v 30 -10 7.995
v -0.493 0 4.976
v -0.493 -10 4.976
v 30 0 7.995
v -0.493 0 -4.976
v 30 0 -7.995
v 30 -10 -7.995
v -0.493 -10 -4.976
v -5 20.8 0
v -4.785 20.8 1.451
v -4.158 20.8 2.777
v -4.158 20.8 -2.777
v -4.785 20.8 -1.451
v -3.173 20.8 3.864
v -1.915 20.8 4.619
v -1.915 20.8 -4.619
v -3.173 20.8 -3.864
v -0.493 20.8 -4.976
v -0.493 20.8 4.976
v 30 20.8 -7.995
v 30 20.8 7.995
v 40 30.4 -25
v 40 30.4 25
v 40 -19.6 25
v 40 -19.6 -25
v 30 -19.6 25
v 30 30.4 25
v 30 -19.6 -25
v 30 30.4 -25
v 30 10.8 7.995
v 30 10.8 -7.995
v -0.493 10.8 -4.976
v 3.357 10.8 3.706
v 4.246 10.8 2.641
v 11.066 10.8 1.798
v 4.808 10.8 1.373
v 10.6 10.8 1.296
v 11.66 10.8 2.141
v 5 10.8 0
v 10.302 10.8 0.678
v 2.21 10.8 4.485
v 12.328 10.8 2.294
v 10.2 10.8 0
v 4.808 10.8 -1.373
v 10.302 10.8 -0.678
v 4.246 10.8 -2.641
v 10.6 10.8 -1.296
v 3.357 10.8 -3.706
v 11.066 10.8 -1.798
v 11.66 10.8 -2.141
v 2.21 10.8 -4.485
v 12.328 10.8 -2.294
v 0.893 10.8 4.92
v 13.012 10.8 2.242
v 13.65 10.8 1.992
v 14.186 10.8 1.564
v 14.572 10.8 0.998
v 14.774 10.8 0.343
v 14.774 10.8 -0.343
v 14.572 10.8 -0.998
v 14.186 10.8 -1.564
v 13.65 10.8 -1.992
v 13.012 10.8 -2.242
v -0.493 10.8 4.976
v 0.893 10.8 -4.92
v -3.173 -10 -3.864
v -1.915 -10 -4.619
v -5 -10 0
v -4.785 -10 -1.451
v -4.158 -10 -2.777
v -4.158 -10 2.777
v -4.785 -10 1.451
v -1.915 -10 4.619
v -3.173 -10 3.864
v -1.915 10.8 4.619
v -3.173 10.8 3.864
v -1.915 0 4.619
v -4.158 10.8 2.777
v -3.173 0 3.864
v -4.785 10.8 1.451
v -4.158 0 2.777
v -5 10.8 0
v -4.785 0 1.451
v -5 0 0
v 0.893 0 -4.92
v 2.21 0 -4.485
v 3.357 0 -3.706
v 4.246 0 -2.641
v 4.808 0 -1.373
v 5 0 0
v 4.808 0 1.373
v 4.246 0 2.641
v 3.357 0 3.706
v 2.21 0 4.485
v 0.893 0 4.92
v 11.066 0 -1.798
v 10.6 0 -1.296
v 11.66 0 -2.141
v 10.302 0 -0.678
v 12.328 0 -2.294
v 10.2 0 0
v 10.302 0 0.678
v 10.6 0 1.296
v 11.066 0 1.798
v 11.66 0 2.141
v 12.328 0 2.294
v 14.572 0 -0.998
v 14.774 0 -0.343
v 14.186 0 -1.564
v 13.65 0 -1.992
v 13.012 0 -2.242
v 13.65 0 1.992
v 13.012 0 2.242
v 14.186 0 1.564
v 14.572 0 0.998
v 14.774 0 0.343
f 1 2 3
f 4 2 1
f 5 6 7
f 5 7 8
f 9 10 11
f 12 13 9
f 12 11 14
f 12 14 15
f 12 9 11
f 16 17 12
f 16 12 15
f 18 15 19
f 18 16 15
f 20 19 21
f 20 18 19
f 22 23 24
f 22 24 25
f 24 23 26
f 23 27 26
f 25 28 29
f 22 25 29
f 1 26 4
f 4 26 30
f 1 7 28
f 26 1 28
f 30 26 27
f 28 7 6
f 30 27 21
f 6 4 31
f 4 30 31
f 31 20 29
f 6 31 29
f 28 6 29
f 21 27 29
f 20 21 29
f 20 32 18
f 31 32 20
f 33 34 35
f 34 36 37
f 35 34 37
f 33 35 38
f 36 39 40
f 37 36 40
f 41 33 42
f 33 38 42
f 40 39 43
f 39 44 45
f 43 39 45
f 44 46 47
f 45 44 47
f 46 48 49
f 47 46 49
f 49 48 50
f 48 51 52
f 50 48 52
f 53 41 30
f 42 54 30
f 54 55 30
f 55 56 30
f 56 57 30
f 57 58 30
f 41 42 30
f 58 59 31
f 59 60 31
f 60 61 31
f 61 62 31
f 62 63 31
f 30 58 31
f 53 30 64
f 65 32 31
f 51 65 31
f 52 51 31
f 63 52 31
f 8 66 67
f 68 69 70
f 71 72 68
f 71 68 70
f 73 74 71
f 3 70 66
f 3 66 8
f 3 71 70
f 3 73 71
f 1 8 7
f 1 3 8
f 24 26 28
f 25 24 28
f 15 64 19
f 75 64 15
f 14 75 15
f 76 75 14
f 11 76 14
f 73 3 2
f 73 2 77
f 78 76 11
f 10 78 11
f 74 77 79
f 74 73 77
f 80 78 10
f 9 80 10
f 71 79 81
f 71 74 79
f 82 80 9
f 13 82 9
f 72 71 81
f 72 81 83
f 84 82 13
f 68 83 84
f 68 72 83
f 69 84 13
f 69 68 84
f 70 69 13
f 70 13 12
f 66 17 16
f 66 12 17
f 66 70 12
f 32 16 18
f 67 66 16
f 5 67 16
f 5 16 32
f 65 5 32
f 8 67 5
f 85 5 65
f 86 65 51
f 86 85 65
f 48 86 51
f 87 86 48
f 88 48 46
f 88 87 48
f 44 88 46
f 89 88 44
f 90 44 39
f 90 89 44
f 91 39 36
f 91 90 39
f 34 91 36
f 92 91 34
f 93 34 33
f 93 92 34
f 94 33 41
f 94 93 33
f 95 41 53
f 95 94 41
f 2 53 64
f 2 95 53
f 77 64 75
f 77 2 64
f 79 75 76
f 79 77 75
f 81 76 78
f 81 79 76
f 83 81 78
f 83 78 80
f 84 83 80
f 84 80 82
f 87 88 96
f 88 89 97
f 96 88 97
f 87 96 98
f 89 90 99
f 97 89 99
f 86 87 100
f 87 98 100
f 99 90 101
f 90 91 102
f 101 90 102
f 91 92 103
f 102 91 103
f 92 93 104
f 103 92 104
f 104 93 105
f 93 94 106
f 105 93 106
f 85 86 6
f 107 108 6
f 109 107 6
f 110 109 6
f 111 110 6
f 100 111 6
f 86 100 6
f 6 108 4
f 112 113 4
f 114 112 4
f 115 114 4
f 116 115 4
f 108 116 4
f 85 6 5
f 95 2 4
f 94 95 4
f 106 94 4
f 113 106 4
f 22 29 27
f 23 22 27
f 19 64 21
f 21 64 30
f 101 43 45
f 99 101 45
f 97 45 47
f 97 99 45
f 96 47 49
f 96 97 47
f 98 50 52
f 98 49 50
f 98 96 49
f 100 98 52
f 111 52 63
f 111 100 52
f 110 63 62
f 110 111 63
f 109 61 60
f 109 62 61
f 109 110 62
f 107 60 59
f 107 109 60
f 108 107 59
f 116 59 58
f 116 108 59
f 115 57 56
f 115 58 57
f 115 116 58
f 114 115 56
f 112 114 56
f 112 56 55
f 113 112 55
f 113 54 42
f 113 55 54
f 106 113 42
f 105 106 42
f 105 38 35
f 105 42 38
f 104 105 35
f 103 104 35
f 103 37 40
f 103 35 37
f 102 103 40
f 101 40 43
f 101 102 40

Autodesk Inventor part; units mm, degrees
ref_plane "YZ Plane" through (0, 0, 0) normal (1, 0, 0) x (0, 1, 0)
ref_plane "XZ Plane" through (0, 0, 0) normal (0, 1, 0) x (-1, 0, 0)
ref_plane "XY Plane" through (0, 0, 0) normal (0, 0, 1) x (1, 0, 0)
sketch "Boceto1" plane through (0, 0, 0) normal (0, 1, 0) x (-1, 0, 0)
  circle A0 centre (0, 0) radius 5
  circle A1 centre (-12.5, 0) radius 2.3
  dimension "d0" = 10
  dimension "d1" = 4.6
extrude "Extrusión1" add sketch "Boceto1" along normal blind 10.8
sketch "Boceto2" plane through (0, 10.8, 0) normal (0, 1, 0) x (1, 0, 0)
  circle A0 centre (0, 0) radius 5
  line L0 (30, 0) -> (30, -10)
  line L1 (-0.4927, -4.9757) -> (30, -7.9951)
  line L2 (30, 0) -> (30, 10)
  line L3 (-0.4927, 4.9757) -> (30, 7.9951)
extrude "Extrusión2" add sketch "Boceto2" along normal blind 10
sketch "Boceto3" plane through (0, 0, 0) normal (0, -1, 0) x (1, 0, 0)
  line L0 (30, -7.9951) -> (-0.4927, -4.9757) projected
  line L1 (30, 7.9951) -> (30, -7.9951) projected
  line L2 (-0.4927, 4.9757) -> (30, 7.9951) projected
  circle A0 centre (0, 0) radius 5 projected
extrude "Extrusión3" add sketch "Boceto3" along normal blind 10
sketch "Boceto4" plane through (30, 10.8, 7.9951) normal (1, 0, 0) x (0, 0, -1)
  line L0 (0, 0) -> (15.9902, 0) projected
  line L1 (7.9951, 0) -> (7.9951, -10.8) construction
  line L2 (32.9951, 19.6) -> (-17.0049, 19.6)
  line L3 (-17.0049, 19.6) -> (-17.0049, -30.4)
  line L4 (-17.0049, -30.4) -> (32.9951, -30.4)
  line L5 (32.9951, -30.4) -> (32.9951, 19.6)
  line L6 (32.9951, 19.6) -> (-17.0049, -30.4) construction
  line L7 (-17.0049, 19.6) -> (32.9951, -30.4) construction
  point P0 (7.9951, -5.4)
  dimension "d10" = 50
  dimension "d11" = 50
extrude "Extrusión4" add sketch "Boceto4" along normal blind 10
properties part number "Pieza2PrimerEslabon" material "Cristal"
